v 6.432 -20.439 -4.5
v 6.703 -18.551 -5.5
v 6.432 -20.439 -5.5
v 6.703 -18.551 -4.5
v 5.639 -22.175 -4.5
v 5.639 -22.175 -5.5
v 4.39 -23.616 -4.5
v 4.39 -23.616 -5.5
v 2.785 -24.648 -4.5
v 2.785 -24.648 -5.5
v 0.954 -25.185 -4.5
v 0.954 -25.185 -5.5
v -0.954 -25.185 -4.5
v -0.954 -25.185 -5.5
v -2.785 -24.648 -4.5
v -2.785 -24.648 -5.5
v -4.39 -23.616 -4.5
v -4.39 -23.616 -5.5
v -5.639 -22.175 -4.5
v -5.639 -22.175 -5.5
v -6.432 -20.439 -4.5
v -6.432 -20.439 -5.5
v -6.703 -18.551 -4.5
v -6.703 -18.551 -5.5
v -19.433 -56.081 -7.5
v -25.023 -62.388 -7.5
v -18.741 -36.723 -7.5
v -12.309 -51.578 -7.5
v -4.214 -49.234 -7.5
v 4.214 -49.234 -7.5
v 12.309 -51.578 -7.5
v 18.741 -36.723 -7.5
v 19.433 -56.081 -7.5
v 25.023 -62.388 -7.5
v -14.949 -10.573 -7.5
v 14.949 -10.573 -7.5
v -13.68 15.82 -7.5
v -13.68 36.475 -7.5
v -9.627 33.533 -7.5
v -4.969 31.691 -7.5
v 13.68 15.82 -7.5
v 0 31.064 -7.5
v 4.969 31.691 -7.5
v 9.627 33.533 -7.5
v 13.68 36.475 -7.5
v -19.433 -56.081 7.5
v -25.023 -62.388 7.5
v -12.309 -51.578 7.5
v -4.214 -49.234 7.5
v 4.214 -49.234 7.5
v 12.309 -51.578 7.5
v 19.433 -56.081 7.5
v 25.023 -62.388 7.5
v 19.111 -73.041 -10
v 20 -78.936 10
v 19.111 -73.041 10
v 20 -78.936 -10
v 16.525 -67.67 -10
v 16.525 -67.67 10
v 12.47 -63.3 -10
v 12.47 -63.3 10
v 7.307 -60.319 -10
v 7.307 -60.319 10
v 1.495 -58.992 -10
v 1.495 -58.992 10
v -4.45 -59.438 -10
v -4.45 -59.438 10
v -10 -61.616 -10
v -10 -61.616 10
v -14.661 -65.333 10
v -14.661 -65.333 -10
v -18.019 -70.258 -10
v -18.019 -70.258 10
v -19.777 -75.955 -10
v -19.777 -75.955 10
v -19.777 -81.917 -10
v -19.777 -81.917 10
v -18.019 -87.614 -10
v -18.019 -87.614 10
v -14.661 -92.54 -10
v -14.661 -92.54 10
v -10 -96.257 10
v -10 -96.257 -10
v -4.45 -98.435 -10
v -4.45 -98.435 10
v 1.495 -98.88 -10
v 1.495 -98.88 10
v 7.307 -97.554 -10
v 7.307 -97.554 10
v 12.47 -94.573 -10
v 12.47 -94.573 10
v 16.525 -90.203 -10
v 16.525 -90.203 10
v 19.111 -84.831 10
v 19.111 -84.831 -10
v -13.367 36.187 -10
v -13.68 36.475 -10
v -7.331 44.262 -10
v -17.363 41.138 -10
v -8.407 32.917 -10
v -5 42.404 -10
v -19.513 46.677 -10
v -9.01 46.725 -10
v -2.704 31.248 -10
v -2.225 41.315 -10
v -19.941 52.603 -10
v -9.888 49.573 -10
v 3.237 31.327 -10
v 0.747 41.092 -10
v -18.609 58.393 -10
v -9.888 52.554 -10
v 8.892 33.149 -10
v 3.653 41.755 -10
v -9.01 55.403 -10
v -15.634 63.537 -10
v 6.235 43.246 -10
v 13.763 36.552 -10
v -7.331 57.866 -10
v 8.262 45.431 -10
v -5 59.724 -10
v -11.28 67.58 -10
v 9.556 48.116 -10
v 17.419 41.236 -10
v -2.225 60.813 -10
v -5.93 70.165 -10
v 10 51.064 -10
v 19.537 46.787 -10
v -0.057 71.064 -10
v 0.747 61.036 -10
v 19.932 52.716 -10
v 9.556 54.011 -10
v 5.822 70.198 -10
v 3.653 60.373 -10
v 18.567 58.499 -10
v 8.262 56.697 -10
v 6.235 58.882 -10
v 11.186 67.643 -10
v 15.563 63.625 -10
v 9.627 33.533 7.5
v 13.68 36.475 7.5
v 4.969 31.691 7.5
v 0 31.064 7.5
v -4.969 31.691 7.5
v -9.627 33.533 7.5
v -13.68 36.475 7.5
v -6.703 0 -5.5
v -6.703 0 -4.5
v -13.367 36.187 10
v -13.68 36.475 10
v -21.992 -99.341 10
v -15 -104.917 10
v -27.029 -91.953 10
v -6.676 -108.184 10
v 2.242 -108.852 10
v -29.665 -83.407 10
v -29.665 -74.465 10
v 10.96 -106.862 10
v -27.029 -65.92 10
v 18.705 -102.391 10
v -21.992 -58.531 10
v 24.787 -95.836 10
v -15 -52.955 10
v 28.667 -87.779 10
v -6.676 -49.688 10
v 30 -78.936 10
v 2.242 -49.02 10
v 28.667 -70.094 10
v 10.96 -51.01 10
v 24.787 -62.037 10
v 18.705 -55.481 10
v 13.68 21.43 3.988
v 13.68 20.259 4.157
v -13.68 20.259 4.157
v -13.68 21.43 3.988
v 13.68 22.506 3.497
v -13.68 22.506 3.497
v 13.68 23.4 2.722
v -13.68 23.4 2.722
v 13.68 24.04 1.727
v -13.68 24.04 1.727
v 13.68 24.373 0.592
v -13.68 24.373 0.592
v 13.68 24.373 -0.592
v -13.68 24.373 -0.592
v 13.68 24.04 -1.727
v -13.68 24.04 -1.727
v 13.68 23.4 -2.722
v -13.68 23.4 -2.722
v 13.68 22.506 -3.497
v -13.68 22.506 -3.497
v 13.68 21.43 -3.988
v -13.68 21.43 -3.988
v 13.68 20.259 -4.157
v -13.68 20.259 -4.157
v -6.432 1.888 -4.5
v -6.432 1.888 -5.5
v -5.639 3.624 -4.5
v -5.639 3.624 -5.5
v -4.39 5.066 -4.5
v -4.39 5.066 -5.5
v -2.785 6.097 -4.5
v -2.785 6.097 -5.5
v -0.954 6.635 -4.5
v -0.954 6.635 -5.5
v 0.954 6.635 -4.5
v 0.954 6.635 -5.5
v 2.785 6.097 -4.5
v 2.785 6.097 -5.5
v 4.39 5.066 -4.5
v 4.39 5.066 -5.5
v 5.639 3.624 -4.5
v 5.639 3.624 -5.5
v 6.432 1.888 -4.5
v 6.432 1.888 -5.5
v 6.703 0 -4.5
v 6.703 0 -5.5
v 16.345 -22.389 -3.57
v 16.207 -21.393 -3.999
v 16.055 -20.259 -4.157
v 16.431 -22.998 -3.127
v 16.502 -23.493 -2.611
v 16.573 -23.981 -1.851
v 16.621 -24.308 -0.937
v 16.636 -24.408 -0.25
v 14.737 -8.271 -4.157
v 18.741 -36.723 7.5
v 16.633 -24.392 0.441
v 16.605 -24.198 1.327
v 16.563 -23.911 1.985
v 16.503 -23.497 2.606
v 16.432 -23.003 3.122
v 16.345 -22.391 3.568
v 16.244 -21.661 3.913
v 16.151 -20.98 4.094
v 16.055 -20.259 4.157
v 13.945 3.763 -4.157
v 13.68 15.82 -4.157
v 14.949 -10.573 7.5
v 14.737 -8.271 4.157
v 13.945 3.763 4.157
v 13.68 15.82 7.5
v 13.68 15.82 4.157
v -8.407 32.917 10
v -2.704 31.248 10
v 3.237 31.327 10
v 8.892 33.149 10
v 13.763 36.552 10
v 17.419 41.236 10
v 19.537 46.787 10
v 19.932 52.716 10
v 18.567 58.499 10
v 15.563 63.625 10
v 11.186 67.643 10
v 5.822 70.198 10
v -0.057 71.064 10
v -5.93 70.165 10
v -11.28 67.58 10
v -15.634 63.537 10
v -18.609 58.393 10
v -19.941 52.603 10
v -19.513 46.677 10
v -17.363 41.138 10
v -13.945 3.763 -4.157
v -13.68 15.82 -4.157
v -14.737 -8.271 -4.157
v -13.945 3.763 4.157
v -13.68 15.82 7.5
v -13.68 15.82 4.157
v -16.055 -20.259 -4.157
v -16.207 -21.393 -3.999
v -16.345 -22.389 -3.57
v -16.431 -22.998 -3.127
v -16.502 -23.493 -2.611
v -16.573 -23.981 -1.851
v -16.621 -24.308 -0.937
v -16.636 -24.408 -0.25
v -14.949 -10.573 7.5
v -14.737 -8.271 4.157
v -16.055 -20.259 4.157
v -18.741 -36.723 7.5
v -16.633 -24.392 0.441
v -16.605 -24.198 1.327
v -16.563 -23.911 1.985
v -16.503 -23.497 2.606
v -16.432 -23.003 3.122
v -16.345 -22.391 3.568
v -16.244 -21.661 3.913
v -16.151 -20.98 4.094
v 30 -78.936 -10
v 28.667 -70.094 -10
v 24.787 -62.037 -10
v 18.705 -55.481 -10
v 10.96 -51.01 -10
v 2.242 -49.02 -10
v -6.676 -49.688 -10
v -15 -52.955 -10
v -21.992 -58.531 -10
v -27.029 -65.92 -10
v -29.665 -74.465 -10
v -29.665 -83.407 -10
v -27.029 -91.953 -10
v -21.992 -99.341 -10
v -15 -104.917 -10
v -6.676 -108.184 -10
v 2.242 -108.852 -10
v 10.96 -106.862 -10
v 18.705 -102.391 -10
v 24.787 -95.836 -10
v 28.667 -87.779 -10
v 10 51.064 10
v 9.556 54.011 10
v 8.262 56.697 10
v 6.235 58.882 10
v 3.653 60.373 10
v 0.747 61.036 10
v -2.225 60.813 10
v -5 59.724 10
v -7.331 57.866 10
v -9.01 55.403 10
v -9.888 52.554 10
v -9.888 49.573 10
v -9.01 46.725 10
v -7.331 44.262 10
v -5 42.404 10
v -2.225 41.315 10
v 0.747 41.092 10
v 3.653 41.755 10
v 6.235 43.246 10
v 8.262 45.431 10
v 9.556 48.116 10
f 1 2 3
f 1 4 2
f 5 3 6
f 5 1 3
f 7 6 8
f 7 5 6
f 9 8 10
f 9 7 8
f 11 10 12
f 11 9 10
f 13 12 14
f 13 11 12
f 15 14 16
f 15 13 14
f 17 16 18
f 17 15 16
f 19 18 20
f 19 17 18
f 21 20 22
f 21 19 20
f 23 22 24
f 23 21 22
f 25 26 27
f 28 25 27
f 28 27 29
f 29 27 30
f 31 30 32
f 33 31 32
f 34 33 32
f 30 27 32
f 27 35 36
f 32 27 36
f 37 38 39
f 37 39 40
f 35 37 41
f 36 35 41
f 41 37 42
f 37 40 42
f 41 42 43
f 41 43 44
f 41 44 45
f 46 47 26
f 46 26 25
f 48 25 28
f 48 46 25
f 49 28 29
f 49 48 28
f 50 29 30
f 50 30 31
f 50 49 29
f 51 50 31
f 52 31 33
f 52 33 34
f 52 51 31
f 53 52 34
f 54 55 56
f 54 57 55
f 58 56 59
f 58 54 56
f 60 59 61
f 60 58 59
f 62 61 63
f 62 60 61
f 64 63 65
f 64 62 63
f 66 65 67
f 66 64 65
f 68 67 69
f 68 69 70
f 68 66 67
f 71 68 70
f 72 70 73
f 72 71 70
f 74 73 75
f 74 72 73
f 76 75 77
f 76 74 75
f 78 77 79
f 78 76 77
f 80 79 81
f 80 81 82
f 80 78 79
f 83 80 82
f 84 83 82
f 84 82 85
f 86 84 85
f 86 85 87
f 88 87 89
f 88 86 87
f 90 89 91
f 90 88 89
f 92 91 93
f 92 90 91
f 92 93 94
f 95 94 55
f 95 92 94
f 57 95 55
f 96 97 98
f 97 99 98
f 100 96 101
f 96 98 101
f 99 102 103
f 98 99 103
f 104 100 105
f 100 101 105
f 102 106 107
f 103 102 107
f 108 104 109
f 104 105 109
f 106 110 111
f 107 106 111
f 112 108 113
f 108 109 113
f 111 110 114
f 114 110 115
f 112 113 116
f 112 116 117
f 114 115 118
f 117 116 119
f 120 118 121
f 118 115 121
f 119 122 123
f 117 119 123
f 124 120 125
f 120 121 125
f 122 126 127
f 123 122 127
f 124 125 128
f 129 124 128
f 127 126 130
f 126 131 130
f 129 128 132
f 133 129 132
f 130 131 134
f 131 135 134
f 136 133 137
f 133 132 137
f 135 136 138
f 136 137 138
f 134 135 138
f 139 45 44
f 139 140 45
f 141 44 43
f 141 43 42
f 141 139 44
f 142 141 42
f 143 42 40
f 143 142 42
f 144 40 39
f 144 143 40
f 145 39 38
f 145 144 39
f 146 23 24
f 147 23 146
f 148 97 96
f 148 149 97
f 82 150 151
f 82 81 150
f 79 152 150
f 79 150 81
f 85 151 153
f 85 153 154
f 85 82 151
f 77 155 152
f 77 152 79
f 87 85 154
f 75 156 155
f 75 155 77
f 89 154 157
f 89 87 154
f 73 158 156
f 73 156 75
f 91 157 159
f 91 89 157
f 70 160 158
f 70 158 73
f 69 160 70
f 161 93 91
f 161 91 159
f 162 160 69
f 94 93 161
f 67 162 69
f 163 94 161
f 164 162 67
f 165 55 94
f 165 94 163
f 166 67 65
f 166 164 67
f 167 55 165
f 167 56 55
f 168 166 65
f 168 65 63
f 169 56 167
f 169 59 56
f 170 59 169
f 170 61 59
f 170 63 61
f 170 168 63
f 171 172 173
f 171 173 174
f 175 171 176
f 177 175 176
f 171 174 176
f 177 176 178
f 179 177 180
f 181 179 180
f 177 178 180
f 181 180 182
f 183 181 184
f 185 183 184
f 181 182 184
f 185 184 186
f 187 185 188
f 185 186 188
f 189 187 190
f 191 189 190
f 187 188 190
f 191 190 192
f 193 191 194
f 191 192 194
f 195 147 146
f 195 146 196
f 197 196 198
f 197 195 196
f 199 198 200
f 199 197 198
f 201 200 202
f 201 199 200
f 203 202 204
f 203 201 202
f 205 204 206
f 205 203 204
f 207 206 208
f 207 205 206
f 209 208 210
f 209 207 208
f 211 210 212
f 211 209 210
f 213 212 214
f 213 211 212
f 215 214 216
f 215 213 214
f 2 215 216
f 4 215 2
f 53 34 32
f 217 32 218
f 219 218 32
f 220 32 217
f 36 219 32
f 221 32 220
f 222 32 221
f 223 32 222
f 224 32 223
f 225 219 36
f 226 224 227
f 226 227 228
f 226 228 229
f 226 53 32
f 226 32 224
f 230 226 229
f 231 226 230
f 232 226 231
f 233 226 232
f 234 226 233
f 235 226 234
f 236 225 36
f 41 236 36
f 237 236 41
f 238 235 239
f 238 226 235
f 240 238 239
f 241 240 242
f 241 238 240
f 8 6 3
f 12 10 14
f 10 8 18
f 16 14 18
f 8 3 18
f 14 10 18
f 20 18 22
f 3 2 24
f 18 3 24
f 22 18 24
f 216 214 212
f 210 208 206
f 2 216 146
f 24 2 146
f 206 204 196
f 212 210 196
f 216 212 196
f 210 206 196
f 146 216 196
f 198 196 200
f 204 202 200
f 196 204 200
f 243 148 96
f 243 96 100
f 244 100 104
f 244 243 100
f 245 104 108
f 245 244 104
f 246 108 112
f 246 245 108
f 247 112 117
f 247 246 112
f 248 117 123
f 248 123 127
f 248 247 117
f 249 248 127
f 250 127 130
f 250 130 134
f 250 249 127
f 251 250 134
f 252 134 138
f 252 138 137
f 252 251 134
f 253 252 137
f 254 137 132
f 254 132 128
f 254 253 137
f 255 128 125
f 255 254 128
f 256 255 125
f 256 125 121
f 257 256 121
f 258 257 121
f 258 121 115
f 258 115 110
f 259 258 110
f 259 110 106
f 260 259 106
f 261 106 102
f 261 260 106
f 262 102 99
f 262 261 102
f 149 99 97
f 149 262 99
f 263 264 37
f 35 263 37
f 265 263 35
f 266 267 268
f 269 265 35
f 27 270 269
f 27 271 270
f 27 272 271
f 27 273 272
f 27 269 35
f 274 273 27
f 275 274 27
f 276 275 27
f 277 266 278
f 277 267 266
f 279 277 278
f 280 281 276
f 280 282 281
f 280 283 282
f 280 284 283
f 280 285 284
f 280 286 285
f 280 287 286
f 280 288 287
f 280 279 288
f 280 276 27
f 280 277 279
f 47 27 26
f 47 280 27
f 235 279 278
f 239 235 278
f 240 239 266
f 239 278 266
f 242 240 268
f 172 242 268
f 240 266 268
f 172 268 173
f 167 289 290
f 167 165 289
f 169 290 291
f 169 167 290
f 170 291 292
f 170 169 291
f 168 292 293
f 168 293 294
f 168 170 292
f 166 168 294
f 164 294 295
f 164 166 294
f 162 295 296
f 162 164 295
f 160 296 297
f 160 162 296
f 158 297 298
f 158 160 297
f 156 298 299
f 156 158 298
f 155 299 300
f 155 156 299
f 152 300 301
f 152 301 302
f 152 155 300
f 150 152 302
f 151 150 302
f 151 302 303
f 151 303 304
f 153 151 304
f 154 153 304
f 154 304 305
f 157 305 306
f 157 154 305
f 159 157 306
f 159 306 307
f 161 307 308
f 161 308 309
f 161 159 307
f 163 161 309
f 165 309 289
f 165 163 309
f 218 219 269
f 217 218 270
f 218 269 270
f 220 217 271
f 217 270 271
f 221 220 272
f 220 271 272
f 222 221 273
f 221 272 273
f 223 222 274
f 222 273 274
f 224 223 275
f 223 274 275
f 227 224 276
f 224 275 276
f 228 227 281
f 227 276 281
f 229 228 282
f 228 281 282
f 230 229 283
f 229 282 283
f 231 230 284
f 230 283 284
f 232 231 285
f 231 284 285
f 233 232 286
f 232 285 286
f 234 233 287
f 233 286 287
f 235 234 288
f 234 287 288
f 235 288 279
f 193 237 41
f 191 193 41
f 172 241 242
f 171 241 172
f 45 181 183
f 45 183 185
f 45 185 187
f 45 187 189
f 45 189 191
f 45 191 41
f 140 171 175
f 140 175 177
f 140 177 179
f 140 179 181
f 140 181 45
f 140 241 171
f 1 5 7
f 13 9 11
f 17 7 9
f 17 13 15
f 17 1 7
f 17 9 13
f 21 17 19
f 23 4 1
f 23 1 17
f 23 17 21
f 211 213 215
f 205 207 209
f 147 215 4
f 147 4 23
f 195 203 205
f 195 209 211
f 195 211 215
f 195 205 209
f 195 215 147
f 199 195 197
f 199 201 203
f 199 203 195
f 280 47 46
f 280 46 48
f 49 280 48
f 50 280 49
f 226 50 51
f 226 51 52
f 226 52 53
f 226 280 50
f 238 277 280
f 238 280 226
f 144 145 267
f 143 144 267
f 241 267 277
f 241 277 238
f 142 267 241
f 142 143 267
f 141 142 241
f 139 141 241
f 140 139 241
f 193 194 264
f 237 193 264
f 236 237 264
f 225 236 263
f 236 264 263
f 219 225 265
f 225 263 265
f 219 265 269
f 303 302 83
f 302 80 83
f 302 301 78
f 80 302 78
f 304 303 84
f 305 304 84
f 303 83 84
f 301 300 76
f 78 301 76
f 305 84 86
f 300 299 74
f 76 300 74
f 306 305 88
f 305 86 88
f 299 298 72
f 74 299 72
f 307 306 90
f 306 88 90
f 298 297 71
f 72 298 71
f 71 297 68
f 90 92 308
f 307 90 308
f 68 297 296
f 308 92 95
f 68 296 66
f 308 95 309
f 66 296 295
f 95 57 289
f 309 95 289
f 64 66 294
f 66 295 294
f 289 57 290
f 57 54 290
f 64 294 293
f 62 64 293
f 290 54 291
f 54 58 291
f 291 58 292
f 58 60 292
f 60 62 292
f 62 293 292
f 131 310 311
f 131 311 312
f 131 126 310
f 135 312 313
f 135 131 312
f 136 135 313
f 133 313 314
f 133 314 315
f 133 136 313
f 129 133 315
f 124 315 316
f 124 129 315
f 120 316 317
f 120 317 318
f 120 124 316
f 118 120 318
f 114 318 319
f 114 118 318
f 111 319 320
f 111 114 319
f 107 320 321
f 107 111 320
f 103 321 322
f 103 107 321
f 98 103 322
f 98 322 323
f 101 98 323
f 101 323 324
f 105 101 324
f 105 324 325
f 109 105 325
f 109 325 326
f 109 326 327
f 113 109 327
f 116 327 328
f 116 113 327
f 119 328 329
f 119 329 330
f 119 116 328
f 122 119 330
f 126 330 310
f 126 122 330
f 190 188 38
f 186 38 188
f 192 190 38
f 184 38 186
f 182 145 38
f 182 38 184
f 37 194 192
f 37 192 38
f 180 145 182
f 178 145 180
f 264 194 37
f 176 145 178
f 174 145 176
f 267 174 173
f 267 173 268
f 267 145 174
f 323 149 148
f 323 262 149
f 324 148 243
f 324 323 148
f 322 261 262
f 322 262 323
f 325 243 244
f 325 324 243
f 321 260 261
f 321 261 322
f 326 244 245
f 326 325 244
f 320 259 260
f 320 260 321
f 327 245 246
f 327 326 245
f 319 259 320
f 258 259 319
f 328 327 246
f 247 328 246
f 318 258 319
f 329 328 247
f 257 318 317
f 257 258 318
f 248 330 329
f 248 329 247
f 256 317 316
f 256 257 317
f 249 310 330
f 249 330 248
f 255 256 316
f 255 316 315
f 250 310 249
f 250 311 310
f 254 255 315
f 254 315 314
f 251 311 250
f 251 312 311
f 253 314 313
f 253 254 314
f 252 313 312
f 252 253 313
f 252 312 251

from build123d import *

# Parameters (mm, degrees)
SKETCH1_R               = 10
BOSS_EXTRUDE1_DEPTH     = 10
SKETCH1_R_2             = 30
SKETCH1_R_3             = 20
BOSS_EXTRUDE1_2_DEPTH   = 10
BOSS_EXTRUDE4_DEPTH     = 7.5
CUT_EXTRUDE1_DEPTH      = 114.433192588
CUT_EXTRUDE1_DEPTH_BACK = 117.433192588
CUT_EXTRUDE1_START      = 3
CUT_EXTRUDE2_START      = -5
CUT_EXTRUDE2_DEPTH      = 0.5


with BuildPart() as part:
    # Sketch1 → Boss-Extrude1 (new, symmetric)
    with BuildSketch(Plane.XY):
        with BuildLine():
            Line((-13.680465752, 36.474626355), (-13.367378576, 36.187231049))
            ThreePointArc((-13.367378576, 36.187231049), (13.524685568, 65.797562521), (-13.680465752, 36.474626355))
        make_face()
        with Locations((0, 51.063829787)):
            Circle(SKETCH1_R, mode=Mode.SUBTRACT)
    extrude(amount=BOSS_EXTRUDE1_DEPTH, both=True)


with BuildPart() as body_2:
    # Sketch1 → Boss-Extrude1 2 (new, symmetric)
    with BuildSketch(Plane.XY):
        with Locations((0, -78.936170213)):
            Circle(SKETCH1_R_2)
        with Locations((0, -78.936170213)):
            Circle(SKETCH1_R_3, mode=Mode.SUBTRACT)
    extrude(amount=BOSS_EXTRUDE1_2_DEPTH, both=True)


with BuildPart() as body_3:
    # Sketch1<4> → Boss-Extrude4 (new, symmetric)
    with BuildSketch(Plane.XY):
        with BuildLine():
            ThreePointArc((13.680465752, 36.474626355), (0.212496848, 31.064958692), (-13.367378576, 36.187231049))
            ThreePointArc((-13.367378576, 36.187231049), (-13.524685568, 36.330097053), (-13.680465752, 36.474626355))
            Line((-13.680465752, 36.474626355), (-13.680465752, 15.820153121))
            ThreePointArc((-13.680465752, 15.820153121), (-16.530963998, -23.693273772), (-25.023427937, -62.38841948))
            ThreePointArc((-25.023427937, -62.38841948), (0, -48.936170213), (25.023427937, -62.38841948))
            ThreePointArc((25.023427937, -62.38841948), (16.530963998, -23.693273772), (13.680465752, 15.820153121))
            Line((13.680465752, 15.820153121), (13.680465752, 36.474626355))
        make_face()
    extrude(amount=BOSS_EXTRUDE4_DEPTH, both=True)

    # Sketch2 → Cut-Extrude1 (cut, two sides: drawn at the far end of the back side and taken through both)
    with BuildSketch(Plane(origin=(0, 0, 0), x_dir=(0, 0, -1), z_dir=(1, 0, 0)).offset(CUT_EXTRUDE1_START - CUT_EXTRUDE1_DEPTH_BACK)):
        with BuildLine():
            Line((4.156679083, 20.258749921), (4.156679083, -20.258749921))
            ThreePointArc((4.156679083, -20.258749921), (0, -24.415429004), (-4.156679083, -20.258749921))
            Line((-4.156679083, -20.258749921), (-4.156679083, 20.258749921))
            ThreePointArc((-4.156679083, 20.258749921), (0, 24.415429004), (4.156679083, 20.258749921))
        make_face()
    extrude(amount=CUT_EXTRUDE1_DEPTH + CUT_EXTRUDE1_DEPTH_BACK, mode=Mode.SUBTRACT)

    # Sketch3 → Cut-Extrude2 (cut, symmetric)
    with BuildSketch(Plane.XY.offset(CUT_EXTRUDE2_START)):
        with BuildLine():
            Line((6.703065473, 0), (6.703065473, -18.550593617))
            ThreePointArc((6.703065473, -18.550593617), (0, -25.25365909), (-6.703065473, -18.550593617))
            Line((-6.703065473, -18.550593617), (-6.703065473, 0))
            ThreePointArc((-6.703065473, 0), (0, 6.703065473), (6.703065473, 0))
        make_face()
    extrude(amount=CUT_EXTRUDE2_DEPTH, both=True, mode=Mode.SUBTRACT)


solid = Compound([part.part, body_2.part, body_3.part])
